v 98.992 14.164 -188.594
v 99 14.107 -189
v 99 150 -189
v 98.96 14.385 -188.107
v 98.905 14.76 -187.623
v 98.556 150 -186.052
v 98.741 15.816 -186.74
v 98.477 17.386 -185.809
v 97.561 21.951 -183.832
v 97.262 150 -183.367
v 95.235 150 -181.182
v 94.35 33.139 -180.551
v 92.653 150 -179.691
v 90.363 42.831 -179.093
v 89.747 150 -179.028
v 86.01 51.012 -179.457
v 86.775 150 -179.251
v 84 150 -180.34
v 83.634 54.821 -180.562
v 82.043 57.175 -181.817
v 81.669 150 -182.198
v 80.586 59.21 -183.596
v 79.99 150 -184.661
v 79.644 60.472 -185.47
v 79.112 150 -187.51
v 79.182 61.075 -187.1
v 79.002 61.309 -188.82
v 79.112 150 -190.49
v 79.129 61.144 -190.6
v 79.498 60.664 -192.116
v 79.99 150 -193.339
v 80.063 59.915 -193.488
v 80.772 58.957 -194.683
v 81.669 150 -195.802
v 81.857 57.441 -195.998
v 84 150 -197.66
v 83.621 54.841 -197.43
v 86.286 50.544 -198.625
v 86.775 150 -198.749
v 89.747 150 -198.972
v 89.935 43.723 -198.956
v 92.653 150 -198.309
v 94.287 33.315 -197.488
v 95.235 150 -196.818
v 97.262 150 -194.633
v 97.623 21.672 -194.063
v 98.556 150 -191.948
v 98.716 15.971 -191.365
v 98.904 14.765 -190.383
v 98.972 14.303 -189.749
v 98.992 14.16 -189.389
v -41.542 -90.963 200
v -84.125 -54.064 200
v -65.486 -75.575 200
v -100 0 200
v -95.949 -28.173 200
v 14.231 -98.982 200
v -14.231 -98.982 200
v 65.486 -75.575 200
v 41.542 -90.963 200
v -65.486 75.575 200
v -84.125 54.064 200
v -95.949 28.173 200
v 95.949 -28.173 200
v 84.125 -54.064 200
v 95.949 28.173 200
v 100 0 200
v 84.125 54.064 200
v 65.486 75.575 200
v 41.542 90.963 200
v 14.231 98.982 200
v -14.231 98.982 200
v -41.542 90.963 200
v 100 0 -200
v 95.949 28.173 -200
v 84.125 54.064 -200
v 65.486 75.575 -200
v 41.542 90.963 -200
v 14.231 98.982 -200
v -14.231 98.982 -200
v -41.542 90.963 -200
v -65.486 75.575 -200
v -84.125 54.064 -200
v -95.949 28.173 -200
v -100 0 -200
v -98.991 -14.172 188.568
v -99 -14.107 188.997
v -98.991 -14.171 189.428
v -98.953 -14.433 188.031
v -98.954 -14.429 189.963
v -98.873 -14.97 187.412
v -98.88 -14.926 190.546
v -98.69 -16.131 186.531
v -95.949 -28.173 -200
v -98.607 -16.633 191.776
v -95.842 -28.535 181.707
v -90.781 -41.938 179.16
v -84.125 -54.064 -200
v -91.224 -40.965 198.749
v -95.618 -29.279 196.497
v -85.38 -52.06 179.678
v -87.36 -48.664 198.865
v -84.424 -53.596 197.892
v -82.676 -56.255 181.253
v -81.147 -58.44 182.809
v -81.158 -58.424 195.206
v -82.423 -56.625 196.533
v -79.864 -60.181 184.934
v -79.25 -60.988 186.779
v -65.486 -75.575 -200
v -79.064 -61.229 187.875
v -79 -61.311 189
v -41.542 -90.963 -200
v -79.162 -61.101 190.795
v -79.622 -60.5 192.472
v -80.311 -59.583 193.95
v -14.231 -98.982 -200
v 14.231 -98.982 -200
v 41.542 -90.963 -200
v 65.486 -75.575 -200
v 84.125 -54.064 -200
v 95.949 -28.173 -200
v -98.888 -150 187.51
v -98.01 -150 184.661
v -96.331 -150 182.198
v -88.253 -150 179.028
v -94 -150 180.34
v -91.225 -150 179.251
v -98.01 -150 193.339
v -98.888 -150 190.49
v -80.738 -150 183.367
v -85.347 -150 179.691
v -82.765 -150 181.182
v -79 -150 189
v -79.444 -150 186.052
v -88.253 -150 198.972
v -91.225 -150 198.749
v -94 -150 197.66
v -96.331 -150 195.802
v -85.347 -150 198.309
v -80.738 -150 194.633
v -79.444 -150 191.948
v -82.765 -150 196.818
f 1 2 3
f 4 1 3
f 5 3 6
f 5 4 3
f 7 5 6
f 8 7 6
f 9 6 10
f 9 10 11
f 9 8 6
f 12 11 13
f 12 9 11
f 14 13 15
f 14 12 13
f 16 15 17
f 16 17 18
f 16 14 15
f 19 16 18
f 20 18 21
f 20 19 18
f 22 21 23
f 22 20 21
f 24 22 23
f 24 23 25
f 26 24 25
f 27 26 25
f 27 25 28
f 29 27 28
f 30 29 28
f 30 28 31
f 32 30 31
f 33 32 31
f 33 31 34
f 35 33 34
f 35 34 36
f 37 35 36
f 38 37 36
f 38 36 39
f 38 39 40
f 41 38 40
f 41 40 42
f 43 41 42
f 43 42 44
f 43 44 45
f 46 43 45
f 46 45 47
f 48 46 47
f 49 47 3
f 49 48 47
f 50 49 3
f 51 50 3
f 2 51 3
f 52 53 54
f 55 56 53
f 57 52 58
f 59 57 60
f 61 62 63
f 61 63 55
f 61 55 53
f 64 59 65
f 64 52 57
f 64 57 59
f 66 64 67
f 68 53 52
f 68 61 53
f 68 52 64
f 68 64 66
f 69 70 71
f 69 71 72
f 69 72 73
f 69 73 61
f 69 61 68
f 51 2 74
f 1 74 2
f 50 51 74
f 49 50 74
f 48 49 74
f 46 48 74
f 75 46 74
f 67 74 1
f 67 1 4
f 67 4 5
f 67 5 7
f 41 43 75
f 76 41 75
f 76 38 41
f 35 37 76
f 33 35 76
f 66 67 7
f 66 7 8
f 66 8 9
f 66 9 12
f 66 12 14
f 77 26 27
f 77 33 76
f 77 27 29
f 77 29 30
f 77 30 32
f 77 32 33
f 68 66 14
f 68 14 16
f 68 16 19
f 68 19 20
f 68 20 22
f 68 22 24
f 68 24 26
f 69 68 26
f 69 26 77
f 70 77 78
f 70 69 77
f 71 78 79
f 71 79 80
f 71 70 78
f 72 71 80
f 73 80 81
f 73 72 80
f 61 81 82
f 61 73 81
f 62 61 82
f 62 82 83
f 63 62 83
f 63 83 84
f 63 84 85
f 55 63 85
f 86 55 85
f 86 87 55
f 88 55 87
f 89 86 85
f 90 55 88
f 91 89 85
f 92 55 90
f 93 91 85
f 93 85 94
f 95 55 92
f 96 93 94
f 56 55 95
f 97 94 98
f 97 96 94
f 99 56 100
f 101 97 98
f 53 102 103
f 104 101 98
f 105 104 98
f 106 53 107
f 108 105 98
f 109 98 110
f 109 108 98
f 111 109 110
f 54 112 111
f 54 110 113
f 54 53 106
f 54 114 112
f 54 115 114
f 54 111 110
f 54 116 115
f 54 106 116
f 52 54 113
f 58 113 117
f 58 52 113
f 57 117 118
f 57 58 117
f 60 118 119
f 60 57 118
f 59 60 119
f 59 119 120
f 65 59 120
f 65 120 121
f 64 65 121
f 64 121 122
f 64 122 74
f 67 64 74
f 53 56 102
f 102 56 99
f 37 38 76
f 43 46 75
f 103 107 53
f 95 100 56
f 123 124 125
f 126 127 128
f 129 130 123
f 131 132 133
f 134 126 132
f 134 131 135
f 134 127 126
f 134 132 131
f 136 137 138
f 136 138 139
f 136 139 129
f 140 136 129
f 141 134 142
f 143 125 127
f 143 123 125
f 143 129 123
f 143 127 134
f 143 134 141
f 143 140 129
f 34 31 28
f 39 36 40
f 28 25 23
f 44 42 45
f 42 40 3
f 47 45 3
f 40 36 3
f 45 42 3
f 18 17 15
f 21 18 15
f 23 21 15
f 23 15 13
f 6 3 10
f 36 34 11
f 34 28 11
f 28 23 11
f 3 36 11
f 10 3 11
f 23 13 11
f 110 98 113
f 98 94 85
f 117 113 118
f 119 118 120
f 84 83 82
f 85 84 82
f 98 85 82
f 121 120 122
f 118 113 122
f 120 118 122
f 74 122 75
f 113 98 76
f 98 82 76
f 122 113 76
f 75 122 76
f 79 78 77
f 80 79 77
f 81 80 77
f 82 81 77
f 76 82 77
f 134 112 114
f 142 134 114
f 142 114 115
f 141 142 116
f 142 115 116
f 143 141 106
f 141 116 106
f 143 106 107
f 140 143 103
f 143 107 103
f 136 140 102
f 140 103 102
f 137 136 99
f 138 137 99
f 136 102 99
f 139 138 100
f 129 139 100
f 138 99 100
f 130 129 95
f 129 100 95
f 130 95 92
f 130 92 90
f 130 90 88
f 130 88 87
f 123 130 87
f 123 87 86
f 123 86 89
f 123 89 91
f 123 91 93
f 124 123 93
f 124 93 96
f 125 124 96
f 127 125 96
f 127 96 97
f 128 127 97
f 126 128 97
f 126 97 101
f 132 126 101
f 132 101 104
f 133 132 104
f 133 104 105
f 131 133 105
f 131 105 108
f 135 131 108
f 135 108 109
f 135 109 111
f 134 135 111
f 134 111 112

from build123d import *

# Parameters (mm, degrees)
F1_R     = 100
F2_DEPTH = 400
F3_R     = 10
F4_DEPTH = 150
F5_R     = 10
F6_DEPTH = 150


with BuildPart() as f2:
    # F1 (on offset) → F2 (new body)
    with BuildSketch(Plane.XY.offset(200)):
        Circle(F1_R)
    extrude(amount=-F2_DEPTH)

    # F3 (on Front) → F4 (join)
    with BuildSketch(Plane.XZ):
        with Locations((-89, 189)):
            Circle(F3_R)
    extrude(amount=F4_DEPTH)

    # F5 (on Front) → F6 (join)
    with BuildSketch(Plane.XZ):
        with Locations((89, -189)):
            Circle(F5_R)
    extrude(amount=-F6_DEPTH)


solid = f2.part
